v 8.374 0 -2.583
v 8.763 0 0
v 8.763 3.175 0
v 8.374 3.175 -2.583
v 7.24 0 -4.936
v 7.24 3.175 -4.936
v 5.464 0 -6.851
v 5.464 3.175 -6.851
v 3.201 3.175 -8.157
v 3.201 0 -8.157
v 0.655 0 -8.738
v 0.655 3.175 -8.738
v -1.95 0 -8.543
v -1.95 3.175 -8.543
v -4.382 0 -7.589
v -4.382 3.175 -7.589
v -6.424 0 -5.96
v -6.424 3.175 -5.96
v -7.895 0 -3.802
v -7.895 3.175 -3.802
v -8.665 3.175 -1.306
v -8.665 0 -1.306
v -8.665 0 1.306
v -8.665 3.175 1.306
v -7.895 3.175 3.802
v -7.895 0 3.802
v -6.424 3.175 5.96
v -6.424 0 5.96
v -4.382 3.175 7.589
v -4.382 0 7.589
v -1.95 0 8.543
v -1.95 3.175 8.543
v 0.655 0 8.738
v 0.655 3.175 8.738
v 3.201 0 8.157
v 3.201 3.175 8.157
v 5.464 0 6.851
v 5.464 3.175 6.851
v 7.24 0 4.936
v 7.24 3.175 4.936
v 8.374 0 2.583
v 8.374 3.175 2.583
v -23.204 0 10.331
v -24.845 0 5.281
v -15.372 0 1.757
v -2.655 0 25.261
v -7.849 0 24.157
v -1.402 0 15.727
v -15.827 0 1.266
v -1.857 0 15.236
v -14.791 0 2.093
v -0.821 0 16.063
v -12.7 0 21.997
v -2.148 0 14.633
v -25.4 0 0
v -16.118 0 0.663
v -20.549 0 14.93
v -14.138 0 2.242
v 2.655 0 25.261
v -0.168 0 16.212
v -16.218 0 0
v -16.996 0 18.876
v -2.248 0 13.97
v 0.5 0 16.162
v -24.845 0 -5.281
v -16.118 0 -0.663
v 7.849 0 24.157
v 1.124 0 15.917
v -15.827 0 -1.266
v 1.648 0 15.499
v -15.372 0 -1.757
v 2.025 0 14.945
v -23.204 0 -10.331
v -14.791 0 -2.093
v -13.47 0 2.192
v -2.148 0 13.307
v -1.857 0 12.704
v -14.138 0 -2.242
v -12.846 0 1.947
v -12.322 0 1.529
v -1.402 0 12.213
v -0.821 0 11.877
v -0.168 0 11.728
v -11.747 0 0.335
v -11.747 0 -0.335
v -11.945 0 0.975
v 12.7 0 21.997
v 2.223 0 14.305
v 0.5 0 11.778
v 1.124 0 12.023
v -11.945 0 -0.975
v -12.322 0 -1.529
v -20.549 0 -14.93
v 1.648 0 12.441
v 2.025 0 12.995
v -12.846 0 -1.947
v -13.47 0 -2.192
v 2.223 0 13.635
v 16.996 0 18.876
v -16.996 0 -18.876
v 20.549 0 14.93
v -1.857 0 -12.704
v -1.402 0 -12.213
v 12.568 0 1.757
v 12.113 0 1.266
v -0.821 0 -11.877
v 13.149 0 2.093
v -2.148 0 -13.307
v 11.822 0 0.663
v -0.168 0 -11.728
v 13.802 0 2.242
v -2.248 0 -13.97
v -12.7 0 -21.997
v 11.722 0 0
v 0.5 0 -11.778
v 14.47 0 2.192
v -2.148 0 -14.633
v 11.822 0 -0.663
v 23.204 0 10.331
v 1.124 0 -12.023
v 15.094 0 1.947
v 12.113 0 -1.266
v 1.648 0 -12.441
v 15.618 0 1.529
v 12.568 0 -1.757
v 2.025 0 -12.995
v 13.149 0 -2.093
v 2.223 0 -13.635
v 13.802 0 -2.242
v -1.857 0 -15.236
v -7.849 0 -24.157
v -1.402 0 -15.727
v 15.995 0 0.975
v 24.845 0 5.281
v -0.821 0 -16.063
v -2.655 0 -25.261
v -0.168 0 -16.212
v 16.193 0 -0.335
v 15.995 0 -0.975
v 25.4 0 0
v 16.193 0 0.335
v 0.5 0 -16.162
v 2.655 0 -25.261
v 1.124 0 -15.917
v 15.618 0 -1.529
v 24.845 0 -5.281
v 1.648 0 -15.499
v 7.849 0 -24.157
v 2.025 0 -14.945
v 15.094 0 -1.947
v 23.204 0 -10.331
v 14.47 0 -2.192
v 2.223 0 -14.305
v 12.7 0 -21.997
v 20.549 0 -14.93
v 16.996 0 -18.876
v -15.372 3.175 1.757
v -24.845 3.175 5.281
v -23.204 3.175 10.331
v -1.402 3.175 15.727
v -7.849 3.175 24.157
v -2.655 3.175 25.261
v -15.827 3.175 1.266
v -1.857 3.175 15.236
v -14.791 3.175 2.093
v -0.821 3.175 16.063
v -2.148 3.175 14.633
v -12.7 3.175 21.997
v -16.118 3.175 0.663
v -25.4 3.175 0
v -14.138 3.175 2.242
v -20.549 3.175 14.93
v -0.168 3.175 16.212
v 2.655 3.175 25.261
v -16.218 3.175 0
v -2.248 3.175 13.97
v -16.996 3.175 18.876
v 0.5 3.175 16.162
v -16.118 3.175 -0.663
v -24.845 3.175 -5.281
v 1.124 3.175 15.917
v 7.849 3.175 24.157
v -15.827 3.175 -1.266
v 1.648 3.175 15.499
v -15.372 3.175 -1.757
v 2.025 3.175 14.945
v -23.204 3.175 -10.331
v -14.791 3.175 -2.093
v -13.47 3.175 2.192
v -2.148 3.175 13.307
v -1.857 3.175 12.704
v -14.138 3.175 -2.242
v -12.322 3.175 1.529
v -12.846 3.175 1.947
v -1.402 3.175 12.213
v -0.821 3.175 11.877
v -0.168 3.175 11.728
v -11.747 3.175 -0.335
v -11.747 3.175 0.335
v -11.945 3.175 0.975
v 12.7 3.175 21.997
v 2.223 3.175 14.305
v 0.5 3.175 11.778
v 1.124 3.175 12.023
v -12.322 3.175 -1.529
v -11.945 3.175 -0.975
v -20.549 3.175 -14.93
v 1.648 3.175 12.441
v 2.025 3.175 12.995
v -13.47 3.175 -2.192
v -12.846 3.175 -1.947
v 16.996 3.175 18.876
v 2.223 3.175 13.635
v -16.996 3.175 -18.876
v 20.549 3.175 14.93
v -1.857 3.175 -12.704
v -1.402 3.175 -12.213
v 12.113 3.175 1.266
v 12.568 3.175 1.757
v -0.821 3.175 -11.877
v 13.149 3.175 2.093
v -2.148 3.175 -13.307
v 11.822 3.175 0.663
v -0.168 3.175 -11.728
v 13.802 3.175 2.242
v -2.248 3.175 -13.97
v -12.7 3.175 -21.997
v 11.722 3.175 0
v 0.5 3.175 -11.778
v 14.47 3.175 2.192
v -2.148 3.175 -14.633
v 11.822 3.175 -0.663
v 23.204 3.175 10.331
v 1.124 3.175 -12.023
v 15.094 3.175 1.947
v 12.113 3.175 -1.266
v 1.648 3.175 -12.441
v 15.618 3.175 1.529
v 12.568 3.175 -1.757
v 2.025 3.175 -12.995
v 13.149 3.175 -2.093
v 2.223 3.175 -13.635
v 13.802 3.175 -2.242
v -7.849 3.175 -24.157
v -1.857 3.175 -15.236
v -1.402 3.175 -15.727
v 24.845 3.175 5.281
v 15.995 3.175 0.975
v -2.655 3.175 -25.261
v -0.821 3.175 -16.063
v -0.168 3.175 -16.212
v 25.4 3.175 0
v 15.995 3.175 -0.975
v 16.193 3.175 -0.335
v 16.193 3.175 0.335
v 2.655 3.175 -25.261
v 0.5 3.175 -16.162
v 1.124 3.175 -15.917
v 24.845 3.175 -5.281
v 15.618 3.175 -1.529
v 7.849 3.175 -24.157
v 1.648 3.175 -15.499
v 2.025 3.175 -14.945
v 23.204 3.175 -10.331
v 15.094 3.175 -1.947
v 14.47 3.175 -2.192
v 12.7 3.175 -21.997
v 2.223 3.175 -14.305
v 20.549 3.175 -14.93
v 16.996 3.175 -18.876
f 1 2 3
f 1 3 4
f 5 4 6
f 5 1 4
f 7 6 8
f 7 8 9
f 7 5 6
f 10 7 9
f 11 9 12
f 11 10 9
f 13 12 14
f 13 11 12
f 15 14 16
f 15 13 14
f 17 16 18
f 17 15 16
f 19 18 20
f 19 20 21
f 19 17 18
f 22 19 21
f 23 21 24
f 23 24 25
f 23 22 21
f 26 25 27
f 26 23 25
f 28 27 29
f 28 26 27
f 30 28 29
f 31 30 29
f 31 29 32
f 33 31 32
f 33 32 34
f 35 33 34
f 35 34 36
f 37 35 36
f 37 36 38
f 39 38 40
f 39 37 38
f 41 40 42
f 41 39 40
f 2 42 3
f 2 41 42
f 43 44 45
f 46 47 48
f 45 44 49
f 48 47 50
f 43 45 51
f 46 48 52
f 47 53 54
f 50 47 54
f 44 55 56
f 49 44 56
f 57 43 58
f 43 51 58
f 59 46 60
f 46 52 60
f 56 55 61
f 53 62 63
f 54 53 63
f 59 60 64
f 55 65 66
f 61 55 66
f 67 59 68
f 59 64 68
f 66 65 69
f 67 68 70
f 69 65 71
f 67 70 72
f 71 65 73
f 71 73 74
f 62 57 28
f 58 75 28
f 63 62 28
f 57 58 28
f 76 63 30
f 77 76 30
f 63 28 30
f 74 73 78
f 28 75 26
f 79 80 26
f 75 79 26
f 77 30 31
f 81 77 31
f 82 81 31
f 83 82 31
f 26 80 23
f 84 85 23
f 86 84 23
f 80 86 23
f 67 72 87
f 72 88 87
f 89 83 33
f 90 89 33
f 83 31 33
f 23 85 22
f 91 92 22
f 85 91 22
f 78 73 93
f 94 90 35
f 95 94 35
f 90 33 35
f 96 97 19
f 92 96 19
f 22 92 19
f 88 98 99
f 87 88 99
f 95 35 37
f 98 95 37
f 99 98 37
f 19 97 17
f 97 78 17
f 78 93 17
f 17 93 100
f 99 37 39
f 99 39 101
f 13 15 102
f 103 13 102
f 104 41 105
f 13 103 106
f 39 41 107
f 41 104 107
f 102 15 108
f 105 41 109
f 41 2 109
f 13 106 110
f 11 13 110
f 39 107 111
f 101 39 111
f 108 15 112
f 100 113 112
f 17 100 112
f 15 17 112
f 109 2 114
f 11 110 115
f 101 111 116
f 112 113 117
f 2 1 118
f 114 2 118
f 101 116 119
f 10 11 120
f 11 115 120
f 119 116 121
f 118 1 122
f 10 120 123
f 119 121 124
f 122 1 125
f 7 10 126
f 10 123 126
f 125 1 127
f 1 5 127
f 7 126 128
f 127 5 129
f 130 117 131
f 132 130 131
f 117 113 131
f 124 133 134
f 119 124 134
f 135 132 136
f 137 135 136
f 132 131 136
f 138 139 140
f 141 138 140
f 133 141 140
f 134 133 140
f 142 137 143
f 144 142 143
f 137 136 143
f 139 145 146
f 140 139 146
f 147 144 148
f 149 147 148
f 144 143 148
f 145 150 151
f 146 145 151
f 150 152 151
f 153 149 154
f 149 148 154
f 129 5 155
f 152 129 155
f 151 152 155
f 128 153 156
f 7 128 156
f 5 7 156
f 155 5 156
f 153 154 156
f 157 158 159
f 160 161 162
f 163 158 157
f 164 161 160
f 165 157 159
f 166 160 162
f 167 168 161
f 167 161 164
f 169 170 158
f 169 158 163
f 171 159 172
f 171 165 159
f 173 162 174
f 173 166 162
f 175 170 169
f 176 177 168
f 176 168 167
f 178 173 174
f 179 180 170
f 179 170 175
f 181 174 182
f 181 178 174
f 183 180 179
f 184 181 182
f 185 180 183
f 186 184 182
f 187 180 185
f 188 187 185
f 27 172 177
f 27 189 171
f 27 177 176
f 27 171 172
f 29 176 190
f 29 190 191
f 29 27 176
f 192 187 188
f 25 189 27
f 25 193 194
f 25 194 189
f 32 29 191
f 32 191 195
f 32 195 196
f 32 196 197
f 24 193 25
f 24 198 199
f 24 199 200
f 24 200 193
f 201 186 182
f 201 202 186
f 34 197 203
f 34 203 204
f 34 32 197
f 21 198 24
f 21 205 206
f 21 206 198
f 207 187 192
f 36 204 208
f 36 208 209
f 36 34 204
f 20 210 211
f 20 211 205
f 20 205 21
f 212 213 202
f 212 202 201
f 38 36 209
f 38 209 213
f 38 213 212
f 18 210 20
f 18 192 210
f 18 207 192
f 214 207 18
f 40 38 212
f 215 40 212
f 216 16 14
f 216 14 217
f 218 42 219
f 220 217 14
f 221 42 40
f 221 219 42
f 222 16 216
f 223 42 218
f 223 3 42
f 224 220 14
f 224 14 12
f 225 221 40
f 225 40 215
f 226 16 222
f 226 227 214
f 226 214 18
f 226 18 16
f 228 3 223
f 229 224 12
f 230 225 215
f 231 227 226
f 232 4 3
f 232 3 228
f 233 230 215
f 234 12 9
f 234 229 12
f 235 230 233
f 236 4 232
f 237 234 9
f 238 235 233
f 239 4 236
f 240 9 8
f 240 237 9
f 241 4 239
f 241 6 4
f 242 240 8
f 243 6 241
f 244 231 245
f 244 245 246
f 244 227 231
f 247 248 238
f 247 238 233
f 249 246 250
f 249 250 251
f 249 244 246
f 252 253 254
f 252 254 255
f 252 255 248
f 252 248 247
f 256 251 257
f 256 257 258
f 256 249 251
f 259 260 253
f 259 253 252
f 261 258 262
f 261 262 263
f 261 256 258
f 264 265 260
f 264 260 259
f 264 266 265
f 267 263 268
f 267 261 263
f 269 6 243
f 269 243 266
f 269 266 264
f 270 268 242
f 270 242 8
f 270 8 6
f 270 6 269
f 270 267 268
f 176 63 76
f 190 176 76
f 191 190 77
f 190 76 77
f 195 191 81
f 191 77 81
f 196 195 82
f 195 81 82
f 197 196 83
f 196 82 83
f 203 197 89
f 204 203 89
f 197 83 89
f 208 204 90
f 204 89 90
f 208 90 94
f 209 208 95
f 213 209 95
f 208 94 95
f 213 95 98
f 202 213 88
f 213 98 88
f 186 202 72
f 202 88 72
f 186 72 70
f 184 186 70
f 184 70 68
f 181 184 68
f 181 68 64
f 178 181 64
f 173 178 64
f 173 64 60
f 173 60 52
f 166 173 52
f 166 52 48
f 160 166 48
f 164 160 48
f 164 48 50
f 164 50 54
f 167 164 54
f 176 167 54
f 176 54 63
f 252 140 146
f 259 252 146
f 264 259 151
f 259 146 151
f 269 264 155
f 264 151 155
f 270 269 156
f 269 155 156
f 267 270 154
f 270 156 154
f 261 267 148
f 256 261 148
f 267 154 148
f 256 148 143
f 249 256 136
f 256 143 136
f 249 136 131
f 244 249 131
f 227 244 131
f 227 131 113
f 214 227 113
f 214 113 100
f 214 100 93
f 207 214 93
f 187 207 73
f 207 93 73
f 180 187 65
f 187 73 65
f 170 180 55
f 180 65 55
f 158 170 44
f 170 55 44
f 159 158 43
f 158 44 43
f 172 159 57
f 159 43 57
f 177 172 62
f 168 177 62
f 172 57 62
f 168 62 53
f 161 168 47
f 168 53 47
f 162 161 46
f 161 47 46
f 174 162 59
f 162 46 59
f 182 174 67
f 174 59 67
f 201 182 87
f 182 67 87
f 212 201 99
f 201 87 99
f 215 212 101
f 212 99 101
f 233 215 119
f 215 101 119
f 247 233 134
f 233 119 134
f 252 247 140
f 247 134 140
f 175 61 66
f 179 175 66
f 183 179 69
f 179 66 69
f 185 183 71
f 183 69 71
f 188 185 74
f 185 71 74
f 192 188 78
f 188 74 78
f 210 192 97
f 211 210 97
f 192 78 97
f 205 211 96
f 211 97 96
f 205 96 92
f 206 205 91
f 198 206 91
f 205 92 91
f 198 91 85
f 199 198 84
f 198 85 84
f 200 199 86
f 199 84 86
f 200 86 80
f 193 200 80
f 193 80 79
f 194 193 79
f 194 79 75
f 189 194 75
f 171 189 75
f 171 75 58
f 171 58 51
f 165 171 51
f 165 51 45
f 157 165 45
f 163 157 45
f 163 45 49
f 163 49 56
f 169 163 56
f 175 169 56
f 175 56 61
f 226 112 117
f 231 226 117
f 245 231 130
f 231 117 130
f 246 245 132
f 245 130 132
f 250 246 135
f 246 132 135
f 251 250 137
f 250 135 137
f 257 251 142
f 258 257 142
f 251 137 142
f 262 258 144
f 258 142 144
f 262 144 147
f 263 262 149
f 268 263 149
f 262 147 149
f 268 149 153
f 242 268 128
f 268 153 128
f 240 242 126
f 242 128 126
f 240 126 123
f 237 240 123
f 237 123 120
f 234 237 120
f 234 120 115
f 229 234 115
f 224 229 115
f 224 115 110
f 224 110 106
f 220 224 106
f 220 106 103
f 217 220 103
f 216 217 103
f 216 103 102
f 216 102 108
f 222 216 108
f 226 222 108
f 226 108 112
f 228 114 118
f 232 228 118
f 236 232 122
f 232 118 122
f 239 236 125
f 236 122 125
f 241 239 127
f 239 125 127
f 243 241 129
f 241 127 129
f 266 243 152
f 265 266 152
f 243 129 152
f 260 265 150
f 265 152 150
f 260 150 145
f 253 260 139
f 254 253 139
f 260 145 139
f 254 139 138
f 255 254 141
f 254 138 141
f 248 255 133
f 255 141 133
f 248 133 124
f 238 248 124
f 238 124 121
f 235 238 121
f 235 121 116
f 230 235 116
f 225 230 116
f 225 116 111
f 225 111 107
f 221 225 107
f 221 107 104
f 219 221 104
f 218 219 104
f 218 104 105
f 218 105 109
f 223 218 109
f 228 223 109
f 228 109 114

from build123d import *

# Parameters (mm, degrees)
SKETCH1_R             = 25.4
SKETCH1_R_2           = 8.763
BOSS_EXTRUDE1_DEPTH   = 3.175
F_8_CLEARANCE_HOLE1_D = 4.4958


with BuildPart() as part:
    # Sketch1 → Boss-Extrude1 (new body)
    with BuildSketch(Plane(origin=(0, 0, 0), x_dir=(1, 0, 0), z_dir=(0, 1, 0))):
        Circle(SKETCH1_R)
        Circle(SKETCH1_R_2, mode=Mode.SUBTRACT)
    extrude(amount=BOSS_EXTRUDE1_DEPTH)

    # #8 Clearance Hole1 (through all)
    with Locations(Plane(origin=(0, 3.175, 0), x_dir=(1, 0, 0), z_dir=(0, 1, 0))):
        with Locations((13.97, 0), (0, 13.97), (-13.97, 0), (0, -13.97)):
            Hole(F_8_CLEARANCE_HOLE1_D / 2)


solid = part.part
